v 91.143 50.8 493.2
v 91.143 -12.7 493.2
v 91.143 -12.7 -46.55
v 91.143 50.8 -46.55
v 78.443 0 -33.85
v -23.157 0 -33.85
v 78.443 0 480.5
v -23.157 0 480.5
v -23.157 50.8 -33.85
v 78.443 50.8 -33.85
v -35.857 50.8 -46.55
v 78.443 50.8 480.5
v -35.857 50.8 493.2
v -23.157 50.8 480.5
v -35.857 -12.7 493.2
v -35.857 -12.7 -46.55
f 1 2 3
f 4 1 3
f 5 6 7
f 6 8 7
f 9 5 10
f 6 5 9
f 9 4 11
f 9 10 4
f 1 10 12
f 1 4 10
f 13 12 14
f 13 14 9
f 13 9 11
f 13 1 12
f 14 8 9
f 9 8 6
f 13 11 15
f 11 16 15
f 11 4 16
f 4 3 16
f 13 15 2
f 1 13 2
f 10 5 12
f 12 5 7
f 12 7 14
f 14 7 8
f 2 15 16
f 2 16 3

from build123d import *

# Parameters (mm, degrees)
F0_W     = 127
F0_H     = 539.75
F1_DEPTH = 12.7
F2_W     = 12.7
F2_H     = 514.35
F2_H_2   = 12.7
F2_W_2   = 16.901414
F2_W_3   = 84.698586
F2_W_4   = 101.6
F3_DEPTH = 50.8


with BuildPart() as f1:
    # F0 (on Front) → F1 (new body)
    with BuildSketch(Plane.XZ):
        with Locations((27.642982, 223.3254)):
            Rectangle(F0_W, F0_H)
    extrude(amount=F1_DEPTH)

    # F2 (on face) → F3 (join)
    with BuildSketch(Plane(origin=(0, 0, 0), x_dir=(-1, 0, 0), z_dir=(0, 1, 0))):
        with Locations((-84.792982, 223.3254)):
            Rectangle(F2_W, F2_H)
        with Locations((-84.792982, 486.8504)):
            Rectangle(F2_W, F2_H_2)
        with Locations((-69.992275, 486.8504)):
            Rectangle(F2_W_2, F2_H_2)
        with Locations((-19.192275, 486.8504)):
            Rectangle(F2_W_3, F2_H_2)
        with Locations((29.507018, 486.8504)):
            Rectangle(F2_W, F2_H_2)
        with Locations((29.507018, 223.3254)):
            Rectangle(F2_W, F2_H)
        with Locations((29.507018, -40.1996)):
            Rectangle(F2_W, F2_H_2)
        with Locations((-27.642982, -40.1996)):
            Rectangle(F2_W_4, F2_H_2)
        with Locations((-84.792982, -40.1996)):
            Rectangle(F2_W, F2_H_2)
    extrude(amount=F3_DEPTH)


solid = f1.part
